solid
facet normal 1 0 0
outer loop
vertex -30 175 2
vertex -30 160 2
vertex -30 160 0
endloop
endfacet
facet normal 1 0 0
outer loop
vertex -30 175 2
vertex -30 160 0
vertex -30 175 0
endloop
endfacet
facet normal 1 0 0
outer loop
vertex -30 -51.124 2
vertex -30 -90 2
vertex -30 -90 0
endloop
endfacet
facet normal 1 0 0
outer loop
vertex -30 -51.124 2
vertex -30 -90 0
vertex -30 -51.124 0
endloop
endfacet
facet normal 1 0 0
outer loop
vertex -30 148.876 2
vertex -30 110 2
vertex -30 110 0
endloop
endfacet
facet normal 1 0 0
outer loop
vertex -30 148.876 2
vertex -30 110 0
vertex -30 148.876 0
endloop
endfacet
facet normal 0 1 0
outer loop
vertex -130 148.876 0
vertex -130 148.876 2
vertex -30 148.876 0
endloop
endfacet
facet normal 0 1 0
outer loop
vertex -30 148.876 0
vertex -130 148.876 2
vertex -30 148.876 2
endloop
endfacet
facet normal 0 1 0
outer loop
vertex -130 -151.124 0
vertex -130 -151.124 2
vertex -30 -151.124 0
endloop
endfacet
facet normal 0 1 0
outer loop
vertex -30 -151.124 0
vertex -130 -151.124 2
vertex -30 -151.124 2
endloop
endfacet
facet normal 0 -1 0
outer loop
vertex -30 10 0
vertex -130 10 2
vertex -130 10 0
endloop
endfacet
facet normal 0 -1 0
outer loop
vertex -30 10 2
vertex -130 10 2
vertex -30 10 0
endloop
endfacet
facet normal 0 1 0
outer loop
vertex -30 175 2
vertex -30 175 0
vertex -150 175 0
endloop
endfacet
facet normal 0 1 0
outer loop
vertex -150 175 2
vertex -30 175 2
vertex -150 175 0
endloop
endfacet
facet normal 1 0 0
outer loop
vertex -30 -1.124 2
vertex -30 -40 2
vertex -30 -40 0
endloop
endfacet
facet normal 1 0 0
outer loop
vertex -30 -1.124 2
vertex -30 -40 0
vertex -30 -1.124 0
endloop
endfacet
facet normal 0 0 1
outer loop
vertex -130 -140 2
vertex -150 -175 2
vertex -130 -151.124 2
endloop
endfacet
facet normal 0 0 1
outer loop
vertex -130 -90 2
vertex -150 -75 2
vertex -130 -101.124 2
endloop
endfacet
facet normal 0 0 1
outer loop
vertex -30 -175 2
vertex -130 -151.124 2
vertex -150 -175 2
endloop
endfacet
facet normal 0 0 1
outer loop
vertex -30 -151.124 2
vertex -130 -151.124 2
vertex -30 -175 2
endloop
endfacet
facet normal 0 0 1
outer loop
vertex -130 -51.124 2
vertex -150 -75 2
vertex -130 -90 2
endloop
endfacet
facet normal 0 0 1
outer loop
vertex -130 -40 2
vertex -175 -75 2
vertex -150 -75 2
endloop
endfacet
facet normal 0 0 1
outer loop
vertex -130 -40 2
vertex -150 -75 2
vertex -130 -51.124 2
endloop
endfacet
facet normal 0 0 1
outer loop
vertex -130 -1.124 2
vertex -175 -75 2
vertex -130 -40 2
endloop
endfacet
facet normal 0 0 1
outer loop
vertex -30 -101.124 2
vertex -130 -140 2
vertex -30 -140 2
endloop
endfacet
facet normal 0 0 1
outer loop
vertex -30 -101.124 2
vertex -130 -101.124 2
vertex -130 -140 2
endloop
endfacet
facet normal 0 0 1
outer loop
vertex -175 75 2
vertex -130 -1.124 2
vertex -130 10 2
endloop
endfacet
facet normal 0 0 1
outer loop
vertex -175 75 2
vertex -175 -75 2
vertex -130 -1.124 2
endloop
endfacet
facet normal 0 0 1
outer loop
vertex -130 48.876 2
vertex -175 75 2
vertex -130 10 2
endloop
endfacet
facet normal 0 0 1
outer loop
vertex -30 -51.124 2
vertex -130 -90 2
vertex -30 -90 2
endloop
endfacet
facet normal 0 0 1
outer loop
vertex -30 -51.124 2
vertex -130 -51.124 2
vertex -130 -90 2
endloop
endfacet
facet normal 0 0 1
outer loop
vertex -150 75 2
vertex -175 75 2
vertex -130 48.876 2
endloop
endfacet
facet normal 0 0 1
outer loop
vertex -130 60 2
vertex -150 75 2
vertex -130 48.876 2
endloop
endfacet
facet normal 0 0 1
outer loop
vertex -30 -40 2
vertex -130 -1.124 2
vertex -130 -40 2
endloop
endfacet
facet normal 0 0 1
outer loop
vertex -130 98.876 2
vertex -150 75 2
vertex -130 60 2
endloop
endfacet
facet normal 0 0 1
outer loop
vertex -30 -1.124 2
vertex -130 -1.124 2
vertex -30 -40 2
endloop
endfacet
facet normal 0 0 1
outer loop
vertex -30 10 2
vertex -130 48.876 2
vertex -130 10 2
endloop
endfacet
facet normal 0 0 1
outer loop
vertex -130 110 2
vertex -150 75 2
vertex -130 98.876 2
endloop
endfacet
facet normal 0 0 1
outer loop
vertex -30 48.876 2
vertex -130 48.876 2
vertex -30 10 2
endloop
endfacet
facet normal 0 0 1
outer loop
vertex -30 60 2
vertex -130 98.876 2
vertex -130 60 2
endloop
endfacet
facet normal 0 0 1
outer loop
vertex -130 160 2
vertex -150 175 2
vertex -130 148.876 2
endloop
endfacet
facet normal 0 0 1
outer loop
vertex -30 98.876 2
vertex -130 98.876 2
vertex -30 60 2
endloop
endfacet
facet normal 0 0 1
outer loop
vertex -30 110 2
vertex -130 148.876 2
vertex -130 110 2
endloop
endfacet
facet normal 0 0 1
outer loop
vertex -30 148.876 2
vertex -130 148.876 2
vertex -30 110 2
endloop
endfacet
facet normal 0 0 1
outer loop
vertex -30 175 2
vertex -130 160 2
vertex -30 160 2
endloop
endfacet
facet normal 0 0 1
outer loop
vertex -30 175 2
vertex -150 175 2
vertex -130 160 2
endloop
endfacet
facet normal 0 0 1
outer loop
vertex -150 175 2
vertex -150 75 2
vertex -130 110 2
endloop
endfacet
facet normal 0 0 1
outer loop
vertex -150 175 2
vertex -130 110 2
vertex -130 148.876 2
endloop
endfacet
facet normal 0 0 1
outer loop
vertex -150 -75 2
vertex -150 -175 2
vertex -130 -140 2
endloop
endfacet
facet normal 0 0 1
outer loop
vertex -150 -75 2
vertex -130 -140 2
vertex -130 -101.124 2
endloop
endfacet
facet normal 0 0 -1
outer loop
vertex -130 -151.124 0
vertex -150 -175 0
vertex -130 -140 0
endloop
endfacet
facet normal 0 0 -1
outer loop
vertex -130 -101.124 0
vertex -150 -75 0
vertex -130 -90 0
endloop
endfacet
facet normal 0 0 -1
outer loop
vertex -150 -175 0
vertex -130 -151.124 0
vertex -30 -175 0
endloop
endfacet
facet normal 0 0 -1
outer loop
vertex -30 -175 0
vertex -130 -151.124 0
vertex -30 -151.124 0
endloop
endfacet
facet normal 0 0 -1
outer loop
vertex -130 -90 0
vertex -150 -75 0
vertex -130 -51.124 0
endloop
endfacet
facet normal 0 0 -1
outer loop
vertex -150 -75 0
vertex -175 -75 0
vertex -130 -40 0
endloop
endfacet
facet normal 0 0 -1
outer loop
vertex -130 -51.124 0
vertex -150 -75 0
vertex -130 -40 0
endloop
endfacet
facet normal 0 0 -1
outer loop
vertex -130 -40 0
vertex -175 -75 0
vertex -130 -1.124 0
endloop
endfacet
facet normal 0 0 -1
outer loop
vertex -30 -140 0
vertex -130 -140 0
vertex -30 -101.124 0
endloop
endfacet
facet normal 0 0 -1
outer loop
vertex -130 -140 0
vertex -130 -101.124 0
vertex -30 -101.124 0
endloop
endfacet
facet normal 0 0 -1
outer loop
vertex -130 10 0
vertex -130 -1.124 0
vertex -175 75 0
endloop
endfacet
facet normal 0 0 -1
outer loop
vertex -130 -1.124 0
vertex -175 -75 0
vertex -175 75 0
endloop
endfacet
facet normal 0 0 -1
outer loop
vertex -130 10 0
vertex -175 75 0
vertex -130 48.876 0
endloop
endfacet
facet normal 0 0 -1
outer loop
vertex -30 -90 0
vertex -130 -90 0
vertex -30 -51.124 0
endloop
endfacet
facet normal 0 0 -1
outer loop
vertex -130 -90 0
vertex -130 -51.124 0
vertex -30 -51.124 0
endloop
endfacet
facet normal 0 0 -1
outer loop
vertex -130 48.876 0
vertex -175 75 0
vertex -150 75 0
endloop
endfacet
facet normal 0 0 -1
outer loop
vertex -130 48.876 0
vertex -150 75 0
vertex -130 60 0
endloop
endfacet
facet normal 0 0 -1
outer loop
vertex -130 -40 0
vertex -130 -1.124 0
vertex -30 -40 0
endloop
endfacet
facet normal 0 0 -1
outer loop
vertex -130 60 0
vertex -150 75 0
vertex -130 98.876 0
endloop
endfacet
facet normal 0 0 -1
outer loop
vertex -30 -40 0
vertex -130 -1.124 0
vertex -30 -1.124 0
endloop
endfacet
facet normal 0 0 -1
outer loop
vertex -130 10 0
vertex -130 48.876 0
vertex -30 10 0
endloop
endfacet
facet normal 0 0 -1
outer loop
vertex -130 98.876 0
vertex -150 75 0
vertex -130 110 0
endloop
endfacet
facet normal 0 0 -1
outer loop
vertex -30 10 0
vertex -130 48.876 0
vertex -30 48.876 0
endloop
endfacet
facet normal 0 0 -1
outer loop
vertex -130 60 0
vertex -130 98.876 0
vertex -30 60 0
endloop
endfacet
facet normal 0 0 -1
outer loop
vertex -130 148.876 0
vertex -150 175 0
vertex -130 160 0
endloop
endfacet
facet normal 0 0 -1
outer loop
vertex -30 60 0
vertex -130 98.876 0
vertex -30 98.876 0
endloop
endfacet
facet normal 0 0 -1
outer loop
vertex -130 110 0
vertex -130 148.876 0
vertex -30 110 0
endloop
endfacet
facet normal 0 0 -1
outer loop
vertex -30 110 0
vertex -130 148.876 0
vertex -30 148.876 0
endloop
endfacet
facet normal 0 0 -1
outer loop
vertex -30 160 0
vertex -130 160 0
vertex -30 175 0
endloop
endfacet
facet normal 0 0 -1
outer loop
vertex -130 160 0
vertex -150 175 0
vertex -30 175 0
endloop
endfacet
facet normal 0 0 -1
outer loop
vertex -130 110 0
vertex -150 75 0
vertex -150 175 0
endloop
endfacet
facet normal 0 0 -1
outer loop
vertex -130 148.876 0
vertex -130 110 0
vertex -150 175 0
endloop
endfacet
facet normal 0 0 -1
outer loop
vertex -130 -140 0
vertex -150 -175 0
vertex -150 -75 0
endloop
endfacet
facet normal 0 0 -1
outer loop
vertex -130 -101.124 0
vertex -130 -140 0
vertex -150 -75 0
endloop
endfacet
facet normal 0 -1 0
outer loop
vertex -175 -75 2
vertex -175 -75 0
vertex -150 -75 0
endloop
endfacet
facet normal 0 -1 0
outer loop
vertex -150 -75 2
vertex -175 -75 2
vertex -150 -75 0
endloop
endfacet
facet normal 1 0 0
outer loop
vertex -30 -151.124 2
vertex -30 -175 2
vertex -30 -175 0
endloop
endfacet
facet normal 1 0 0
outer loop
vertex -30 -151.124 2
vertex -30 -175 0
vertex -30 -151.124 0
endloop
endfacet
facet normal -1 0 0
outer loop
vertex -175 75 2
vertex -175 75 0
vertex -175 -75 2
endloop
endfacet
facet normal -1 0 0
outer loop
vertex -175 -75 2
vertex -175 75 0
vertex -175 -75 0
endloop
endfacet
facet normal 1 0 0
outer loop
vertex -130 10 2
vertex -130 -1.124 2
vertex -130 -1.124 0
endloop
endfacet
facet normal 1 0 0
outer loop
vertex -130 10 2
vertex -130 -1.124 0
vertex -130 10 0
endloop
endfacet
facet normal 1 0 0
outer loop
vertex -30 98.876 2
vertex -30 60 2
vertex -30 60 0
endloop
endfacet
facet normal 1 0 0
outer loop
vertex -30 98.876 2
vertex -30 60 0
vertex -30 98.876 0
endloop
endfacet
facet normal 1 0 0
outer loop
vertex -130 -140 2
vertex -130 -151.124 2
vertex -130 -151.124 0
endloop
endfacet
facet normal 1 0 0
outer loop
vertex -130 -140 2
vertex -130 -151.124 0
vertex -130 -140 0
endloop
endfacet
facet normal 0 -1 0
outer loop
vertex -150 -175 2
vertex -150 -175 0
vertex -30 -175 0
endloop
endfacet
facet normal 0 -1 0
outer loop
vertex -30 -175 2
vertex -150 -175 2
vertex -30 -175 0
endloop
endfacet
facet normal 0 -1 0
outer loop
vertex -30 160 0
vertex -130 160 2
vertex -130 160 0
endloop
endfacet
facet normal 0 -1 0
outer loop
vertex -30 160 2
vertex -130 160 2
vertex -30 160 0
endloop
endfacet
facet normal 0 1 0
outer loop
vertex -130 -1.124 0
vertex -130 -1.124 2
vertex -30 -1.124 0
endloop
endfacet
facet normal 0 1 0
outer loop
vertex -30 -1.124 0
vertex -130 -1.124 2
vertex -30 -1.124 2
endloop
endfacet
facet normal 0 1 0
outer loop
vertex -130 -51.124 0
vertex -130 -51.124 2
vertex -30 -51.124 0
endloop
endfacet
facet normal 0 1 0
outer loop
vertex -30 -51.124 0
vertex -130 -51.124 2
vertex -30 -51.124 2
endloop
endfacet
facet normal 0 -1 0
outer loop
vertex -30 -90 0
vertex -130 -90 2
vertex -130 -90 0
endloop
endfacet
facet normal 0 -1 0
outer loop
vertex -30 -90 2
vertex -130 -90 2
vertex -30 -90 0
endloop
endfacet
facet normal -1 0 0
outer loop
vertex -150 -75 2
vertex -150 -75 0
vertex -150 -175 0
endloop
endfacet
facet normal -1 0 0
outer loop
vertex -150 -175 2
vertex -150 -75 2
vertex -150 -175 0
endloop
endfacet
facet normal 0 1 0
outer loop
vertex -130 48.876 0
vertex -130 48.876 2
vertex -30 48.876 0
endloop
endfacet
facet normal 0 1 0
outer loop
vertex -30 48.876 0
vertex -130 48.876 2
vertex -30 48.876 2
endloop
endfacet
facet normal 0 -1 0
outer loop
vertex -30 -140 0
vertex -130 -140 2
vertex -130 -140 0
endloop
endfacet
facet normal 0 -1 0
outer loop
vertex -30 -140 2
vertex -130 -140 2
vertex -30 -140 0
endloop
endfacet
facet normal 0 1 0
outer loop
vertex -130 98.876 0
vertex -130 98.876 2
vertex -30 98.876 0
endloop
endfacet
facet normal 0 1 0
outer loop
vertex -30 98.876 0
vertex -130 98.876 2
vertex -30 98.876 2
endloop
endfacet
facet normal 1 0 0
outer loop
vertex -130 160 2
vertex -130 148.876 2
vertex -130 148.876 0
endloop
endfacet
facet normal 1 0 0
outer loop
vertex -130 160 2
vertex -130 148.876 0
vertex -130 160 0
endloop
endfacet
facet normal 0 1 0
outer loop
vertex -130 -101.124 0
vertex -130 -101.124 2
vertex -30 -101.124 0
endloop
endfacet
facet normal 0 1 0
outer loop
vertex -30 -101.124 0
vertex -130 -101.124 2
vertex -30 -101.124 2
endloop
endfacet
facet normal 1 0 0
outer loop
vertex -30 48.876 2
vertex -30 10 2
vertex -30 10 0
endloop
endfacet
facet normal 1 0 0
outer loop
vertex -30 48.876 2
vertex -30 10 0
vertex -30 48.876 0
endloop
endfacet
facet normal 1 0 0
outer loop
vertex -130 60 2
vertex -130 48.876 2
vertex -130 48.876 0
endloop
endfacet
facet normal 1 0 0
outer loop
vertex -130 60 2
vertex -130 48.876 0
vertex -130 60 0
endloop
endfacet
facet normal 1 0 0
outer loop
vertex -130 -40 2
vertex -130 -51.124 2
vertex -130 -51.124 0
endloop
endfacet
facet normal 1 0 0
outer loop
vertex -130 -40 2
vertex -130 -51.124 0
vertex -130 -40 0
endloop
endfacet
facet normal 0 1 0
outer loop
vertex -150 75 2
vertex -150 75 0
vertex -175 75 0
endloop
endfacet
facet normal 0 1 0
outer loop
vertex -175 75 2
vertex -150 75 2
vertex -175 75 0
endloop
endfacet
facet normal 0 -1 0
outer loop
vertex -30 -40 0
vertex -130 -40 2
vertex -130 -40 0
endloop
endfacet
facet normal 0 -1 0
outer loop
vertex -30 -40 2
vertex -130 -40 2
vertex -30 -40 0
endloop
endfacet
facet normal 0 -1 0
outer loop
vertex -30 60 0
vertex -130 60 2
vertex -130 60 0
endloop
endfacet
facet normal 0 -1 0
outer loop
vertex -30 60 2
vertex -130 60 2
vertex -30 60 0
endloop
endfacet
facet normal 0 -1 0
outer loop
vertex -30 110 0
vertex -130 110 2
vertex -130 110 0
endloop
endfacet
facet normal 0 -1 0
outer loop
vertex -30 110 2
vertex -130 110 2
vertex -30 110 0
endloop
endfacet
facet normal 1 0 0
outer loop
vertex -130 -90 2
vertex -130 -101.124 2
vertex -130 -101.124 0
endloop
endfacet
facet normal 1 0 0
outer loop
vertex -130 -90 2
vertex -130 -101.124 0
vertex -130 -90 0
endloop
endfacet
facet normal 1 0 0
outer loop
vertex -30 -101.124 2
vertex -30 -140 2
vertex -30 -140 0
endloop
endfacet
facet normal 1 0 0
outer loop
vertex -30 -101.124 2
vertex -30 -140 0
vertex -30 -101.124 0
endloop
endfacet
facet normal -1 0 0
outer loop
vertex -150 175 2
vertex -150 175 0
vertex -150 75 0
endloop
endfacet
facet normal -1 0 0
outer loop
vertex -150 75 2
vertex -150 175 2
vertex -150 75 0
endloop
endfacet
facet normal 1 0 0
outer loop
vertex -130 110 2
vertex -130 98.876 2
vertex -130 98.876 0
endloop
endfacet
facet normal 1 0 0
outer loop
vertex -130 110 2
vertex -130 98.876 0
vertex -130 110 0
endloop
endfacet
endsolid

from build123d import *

# Parameters (mm, degrees)
BOSS_EXTRUDE1_DEPTH = 2
SKETCH2_W           = 100
SKETCH2_H           = 11.123940721
CUT_EXTRUDE1_DEPTH  = 2
LPATTERN1_COUNT     = 7
LPATTERN1_PITCH     = 50
CUT_EXTRUDE2_REACH  = 249.495
SKETCH4_W           = 15
SKETCH4_H           = 350


with BuildPart() as part:
    # Sketch1 → Boss-Extrude1 (new body)
    with BuildSketch(Plane.XY):
        Polygon((-15, -175), (-15, 175), (-150, 175), (-150, 75), (-175, 75), (-175, -75), (-150, -75), (-150, -175), align=None)
    extrude(amount=BOSS_EXTRUDE1_DEPTH)

    # Sketch2 → Cut-Extrude1 (cut)
    with BuildSketch(Plane.XY.offset(2)):
        with Locations((-80, 154.43802964)):
            Rectangle(SKETCH2_W, SKETCH2_H)
    cut_extrude1 = extrude(amount=-CUT_EXTRUDE1_DEPTH, mode=Mode.SUBTRACT)

    # LPattern1: Cut-Extrude1 ×7
    with Locations(*[(0, -i * LPATTERN1_PITCH, 0) for i in range(1, LPATTERN1_COUNT)]):
        add(cut_extrude1, mode=Mode.SUBTRACT)

    # Sketch4 → Cut-Extrude2 (cut, up to next)
    with BuildSketch(Plane.XY.offset(2), mode=Mode.PRIVATE) as cut_extrude2_sk1:
        with Locations((-22.5, 0)):
            Rectangle(SKETCH4_W, SKETCH4_H)
    cut_extrude2_tool1 = extrude(cut_extrude2_sk1.sketch, amount=-CUT_EXTRUDE2_REACH, mode=Mode.PRIVATE) & part.part
    add(cut_extrude2_tool1.solids().sort_by_distance((-22.5, 0, 2))[0], mode=Mode.SUBTRACT)


solid = part.part
